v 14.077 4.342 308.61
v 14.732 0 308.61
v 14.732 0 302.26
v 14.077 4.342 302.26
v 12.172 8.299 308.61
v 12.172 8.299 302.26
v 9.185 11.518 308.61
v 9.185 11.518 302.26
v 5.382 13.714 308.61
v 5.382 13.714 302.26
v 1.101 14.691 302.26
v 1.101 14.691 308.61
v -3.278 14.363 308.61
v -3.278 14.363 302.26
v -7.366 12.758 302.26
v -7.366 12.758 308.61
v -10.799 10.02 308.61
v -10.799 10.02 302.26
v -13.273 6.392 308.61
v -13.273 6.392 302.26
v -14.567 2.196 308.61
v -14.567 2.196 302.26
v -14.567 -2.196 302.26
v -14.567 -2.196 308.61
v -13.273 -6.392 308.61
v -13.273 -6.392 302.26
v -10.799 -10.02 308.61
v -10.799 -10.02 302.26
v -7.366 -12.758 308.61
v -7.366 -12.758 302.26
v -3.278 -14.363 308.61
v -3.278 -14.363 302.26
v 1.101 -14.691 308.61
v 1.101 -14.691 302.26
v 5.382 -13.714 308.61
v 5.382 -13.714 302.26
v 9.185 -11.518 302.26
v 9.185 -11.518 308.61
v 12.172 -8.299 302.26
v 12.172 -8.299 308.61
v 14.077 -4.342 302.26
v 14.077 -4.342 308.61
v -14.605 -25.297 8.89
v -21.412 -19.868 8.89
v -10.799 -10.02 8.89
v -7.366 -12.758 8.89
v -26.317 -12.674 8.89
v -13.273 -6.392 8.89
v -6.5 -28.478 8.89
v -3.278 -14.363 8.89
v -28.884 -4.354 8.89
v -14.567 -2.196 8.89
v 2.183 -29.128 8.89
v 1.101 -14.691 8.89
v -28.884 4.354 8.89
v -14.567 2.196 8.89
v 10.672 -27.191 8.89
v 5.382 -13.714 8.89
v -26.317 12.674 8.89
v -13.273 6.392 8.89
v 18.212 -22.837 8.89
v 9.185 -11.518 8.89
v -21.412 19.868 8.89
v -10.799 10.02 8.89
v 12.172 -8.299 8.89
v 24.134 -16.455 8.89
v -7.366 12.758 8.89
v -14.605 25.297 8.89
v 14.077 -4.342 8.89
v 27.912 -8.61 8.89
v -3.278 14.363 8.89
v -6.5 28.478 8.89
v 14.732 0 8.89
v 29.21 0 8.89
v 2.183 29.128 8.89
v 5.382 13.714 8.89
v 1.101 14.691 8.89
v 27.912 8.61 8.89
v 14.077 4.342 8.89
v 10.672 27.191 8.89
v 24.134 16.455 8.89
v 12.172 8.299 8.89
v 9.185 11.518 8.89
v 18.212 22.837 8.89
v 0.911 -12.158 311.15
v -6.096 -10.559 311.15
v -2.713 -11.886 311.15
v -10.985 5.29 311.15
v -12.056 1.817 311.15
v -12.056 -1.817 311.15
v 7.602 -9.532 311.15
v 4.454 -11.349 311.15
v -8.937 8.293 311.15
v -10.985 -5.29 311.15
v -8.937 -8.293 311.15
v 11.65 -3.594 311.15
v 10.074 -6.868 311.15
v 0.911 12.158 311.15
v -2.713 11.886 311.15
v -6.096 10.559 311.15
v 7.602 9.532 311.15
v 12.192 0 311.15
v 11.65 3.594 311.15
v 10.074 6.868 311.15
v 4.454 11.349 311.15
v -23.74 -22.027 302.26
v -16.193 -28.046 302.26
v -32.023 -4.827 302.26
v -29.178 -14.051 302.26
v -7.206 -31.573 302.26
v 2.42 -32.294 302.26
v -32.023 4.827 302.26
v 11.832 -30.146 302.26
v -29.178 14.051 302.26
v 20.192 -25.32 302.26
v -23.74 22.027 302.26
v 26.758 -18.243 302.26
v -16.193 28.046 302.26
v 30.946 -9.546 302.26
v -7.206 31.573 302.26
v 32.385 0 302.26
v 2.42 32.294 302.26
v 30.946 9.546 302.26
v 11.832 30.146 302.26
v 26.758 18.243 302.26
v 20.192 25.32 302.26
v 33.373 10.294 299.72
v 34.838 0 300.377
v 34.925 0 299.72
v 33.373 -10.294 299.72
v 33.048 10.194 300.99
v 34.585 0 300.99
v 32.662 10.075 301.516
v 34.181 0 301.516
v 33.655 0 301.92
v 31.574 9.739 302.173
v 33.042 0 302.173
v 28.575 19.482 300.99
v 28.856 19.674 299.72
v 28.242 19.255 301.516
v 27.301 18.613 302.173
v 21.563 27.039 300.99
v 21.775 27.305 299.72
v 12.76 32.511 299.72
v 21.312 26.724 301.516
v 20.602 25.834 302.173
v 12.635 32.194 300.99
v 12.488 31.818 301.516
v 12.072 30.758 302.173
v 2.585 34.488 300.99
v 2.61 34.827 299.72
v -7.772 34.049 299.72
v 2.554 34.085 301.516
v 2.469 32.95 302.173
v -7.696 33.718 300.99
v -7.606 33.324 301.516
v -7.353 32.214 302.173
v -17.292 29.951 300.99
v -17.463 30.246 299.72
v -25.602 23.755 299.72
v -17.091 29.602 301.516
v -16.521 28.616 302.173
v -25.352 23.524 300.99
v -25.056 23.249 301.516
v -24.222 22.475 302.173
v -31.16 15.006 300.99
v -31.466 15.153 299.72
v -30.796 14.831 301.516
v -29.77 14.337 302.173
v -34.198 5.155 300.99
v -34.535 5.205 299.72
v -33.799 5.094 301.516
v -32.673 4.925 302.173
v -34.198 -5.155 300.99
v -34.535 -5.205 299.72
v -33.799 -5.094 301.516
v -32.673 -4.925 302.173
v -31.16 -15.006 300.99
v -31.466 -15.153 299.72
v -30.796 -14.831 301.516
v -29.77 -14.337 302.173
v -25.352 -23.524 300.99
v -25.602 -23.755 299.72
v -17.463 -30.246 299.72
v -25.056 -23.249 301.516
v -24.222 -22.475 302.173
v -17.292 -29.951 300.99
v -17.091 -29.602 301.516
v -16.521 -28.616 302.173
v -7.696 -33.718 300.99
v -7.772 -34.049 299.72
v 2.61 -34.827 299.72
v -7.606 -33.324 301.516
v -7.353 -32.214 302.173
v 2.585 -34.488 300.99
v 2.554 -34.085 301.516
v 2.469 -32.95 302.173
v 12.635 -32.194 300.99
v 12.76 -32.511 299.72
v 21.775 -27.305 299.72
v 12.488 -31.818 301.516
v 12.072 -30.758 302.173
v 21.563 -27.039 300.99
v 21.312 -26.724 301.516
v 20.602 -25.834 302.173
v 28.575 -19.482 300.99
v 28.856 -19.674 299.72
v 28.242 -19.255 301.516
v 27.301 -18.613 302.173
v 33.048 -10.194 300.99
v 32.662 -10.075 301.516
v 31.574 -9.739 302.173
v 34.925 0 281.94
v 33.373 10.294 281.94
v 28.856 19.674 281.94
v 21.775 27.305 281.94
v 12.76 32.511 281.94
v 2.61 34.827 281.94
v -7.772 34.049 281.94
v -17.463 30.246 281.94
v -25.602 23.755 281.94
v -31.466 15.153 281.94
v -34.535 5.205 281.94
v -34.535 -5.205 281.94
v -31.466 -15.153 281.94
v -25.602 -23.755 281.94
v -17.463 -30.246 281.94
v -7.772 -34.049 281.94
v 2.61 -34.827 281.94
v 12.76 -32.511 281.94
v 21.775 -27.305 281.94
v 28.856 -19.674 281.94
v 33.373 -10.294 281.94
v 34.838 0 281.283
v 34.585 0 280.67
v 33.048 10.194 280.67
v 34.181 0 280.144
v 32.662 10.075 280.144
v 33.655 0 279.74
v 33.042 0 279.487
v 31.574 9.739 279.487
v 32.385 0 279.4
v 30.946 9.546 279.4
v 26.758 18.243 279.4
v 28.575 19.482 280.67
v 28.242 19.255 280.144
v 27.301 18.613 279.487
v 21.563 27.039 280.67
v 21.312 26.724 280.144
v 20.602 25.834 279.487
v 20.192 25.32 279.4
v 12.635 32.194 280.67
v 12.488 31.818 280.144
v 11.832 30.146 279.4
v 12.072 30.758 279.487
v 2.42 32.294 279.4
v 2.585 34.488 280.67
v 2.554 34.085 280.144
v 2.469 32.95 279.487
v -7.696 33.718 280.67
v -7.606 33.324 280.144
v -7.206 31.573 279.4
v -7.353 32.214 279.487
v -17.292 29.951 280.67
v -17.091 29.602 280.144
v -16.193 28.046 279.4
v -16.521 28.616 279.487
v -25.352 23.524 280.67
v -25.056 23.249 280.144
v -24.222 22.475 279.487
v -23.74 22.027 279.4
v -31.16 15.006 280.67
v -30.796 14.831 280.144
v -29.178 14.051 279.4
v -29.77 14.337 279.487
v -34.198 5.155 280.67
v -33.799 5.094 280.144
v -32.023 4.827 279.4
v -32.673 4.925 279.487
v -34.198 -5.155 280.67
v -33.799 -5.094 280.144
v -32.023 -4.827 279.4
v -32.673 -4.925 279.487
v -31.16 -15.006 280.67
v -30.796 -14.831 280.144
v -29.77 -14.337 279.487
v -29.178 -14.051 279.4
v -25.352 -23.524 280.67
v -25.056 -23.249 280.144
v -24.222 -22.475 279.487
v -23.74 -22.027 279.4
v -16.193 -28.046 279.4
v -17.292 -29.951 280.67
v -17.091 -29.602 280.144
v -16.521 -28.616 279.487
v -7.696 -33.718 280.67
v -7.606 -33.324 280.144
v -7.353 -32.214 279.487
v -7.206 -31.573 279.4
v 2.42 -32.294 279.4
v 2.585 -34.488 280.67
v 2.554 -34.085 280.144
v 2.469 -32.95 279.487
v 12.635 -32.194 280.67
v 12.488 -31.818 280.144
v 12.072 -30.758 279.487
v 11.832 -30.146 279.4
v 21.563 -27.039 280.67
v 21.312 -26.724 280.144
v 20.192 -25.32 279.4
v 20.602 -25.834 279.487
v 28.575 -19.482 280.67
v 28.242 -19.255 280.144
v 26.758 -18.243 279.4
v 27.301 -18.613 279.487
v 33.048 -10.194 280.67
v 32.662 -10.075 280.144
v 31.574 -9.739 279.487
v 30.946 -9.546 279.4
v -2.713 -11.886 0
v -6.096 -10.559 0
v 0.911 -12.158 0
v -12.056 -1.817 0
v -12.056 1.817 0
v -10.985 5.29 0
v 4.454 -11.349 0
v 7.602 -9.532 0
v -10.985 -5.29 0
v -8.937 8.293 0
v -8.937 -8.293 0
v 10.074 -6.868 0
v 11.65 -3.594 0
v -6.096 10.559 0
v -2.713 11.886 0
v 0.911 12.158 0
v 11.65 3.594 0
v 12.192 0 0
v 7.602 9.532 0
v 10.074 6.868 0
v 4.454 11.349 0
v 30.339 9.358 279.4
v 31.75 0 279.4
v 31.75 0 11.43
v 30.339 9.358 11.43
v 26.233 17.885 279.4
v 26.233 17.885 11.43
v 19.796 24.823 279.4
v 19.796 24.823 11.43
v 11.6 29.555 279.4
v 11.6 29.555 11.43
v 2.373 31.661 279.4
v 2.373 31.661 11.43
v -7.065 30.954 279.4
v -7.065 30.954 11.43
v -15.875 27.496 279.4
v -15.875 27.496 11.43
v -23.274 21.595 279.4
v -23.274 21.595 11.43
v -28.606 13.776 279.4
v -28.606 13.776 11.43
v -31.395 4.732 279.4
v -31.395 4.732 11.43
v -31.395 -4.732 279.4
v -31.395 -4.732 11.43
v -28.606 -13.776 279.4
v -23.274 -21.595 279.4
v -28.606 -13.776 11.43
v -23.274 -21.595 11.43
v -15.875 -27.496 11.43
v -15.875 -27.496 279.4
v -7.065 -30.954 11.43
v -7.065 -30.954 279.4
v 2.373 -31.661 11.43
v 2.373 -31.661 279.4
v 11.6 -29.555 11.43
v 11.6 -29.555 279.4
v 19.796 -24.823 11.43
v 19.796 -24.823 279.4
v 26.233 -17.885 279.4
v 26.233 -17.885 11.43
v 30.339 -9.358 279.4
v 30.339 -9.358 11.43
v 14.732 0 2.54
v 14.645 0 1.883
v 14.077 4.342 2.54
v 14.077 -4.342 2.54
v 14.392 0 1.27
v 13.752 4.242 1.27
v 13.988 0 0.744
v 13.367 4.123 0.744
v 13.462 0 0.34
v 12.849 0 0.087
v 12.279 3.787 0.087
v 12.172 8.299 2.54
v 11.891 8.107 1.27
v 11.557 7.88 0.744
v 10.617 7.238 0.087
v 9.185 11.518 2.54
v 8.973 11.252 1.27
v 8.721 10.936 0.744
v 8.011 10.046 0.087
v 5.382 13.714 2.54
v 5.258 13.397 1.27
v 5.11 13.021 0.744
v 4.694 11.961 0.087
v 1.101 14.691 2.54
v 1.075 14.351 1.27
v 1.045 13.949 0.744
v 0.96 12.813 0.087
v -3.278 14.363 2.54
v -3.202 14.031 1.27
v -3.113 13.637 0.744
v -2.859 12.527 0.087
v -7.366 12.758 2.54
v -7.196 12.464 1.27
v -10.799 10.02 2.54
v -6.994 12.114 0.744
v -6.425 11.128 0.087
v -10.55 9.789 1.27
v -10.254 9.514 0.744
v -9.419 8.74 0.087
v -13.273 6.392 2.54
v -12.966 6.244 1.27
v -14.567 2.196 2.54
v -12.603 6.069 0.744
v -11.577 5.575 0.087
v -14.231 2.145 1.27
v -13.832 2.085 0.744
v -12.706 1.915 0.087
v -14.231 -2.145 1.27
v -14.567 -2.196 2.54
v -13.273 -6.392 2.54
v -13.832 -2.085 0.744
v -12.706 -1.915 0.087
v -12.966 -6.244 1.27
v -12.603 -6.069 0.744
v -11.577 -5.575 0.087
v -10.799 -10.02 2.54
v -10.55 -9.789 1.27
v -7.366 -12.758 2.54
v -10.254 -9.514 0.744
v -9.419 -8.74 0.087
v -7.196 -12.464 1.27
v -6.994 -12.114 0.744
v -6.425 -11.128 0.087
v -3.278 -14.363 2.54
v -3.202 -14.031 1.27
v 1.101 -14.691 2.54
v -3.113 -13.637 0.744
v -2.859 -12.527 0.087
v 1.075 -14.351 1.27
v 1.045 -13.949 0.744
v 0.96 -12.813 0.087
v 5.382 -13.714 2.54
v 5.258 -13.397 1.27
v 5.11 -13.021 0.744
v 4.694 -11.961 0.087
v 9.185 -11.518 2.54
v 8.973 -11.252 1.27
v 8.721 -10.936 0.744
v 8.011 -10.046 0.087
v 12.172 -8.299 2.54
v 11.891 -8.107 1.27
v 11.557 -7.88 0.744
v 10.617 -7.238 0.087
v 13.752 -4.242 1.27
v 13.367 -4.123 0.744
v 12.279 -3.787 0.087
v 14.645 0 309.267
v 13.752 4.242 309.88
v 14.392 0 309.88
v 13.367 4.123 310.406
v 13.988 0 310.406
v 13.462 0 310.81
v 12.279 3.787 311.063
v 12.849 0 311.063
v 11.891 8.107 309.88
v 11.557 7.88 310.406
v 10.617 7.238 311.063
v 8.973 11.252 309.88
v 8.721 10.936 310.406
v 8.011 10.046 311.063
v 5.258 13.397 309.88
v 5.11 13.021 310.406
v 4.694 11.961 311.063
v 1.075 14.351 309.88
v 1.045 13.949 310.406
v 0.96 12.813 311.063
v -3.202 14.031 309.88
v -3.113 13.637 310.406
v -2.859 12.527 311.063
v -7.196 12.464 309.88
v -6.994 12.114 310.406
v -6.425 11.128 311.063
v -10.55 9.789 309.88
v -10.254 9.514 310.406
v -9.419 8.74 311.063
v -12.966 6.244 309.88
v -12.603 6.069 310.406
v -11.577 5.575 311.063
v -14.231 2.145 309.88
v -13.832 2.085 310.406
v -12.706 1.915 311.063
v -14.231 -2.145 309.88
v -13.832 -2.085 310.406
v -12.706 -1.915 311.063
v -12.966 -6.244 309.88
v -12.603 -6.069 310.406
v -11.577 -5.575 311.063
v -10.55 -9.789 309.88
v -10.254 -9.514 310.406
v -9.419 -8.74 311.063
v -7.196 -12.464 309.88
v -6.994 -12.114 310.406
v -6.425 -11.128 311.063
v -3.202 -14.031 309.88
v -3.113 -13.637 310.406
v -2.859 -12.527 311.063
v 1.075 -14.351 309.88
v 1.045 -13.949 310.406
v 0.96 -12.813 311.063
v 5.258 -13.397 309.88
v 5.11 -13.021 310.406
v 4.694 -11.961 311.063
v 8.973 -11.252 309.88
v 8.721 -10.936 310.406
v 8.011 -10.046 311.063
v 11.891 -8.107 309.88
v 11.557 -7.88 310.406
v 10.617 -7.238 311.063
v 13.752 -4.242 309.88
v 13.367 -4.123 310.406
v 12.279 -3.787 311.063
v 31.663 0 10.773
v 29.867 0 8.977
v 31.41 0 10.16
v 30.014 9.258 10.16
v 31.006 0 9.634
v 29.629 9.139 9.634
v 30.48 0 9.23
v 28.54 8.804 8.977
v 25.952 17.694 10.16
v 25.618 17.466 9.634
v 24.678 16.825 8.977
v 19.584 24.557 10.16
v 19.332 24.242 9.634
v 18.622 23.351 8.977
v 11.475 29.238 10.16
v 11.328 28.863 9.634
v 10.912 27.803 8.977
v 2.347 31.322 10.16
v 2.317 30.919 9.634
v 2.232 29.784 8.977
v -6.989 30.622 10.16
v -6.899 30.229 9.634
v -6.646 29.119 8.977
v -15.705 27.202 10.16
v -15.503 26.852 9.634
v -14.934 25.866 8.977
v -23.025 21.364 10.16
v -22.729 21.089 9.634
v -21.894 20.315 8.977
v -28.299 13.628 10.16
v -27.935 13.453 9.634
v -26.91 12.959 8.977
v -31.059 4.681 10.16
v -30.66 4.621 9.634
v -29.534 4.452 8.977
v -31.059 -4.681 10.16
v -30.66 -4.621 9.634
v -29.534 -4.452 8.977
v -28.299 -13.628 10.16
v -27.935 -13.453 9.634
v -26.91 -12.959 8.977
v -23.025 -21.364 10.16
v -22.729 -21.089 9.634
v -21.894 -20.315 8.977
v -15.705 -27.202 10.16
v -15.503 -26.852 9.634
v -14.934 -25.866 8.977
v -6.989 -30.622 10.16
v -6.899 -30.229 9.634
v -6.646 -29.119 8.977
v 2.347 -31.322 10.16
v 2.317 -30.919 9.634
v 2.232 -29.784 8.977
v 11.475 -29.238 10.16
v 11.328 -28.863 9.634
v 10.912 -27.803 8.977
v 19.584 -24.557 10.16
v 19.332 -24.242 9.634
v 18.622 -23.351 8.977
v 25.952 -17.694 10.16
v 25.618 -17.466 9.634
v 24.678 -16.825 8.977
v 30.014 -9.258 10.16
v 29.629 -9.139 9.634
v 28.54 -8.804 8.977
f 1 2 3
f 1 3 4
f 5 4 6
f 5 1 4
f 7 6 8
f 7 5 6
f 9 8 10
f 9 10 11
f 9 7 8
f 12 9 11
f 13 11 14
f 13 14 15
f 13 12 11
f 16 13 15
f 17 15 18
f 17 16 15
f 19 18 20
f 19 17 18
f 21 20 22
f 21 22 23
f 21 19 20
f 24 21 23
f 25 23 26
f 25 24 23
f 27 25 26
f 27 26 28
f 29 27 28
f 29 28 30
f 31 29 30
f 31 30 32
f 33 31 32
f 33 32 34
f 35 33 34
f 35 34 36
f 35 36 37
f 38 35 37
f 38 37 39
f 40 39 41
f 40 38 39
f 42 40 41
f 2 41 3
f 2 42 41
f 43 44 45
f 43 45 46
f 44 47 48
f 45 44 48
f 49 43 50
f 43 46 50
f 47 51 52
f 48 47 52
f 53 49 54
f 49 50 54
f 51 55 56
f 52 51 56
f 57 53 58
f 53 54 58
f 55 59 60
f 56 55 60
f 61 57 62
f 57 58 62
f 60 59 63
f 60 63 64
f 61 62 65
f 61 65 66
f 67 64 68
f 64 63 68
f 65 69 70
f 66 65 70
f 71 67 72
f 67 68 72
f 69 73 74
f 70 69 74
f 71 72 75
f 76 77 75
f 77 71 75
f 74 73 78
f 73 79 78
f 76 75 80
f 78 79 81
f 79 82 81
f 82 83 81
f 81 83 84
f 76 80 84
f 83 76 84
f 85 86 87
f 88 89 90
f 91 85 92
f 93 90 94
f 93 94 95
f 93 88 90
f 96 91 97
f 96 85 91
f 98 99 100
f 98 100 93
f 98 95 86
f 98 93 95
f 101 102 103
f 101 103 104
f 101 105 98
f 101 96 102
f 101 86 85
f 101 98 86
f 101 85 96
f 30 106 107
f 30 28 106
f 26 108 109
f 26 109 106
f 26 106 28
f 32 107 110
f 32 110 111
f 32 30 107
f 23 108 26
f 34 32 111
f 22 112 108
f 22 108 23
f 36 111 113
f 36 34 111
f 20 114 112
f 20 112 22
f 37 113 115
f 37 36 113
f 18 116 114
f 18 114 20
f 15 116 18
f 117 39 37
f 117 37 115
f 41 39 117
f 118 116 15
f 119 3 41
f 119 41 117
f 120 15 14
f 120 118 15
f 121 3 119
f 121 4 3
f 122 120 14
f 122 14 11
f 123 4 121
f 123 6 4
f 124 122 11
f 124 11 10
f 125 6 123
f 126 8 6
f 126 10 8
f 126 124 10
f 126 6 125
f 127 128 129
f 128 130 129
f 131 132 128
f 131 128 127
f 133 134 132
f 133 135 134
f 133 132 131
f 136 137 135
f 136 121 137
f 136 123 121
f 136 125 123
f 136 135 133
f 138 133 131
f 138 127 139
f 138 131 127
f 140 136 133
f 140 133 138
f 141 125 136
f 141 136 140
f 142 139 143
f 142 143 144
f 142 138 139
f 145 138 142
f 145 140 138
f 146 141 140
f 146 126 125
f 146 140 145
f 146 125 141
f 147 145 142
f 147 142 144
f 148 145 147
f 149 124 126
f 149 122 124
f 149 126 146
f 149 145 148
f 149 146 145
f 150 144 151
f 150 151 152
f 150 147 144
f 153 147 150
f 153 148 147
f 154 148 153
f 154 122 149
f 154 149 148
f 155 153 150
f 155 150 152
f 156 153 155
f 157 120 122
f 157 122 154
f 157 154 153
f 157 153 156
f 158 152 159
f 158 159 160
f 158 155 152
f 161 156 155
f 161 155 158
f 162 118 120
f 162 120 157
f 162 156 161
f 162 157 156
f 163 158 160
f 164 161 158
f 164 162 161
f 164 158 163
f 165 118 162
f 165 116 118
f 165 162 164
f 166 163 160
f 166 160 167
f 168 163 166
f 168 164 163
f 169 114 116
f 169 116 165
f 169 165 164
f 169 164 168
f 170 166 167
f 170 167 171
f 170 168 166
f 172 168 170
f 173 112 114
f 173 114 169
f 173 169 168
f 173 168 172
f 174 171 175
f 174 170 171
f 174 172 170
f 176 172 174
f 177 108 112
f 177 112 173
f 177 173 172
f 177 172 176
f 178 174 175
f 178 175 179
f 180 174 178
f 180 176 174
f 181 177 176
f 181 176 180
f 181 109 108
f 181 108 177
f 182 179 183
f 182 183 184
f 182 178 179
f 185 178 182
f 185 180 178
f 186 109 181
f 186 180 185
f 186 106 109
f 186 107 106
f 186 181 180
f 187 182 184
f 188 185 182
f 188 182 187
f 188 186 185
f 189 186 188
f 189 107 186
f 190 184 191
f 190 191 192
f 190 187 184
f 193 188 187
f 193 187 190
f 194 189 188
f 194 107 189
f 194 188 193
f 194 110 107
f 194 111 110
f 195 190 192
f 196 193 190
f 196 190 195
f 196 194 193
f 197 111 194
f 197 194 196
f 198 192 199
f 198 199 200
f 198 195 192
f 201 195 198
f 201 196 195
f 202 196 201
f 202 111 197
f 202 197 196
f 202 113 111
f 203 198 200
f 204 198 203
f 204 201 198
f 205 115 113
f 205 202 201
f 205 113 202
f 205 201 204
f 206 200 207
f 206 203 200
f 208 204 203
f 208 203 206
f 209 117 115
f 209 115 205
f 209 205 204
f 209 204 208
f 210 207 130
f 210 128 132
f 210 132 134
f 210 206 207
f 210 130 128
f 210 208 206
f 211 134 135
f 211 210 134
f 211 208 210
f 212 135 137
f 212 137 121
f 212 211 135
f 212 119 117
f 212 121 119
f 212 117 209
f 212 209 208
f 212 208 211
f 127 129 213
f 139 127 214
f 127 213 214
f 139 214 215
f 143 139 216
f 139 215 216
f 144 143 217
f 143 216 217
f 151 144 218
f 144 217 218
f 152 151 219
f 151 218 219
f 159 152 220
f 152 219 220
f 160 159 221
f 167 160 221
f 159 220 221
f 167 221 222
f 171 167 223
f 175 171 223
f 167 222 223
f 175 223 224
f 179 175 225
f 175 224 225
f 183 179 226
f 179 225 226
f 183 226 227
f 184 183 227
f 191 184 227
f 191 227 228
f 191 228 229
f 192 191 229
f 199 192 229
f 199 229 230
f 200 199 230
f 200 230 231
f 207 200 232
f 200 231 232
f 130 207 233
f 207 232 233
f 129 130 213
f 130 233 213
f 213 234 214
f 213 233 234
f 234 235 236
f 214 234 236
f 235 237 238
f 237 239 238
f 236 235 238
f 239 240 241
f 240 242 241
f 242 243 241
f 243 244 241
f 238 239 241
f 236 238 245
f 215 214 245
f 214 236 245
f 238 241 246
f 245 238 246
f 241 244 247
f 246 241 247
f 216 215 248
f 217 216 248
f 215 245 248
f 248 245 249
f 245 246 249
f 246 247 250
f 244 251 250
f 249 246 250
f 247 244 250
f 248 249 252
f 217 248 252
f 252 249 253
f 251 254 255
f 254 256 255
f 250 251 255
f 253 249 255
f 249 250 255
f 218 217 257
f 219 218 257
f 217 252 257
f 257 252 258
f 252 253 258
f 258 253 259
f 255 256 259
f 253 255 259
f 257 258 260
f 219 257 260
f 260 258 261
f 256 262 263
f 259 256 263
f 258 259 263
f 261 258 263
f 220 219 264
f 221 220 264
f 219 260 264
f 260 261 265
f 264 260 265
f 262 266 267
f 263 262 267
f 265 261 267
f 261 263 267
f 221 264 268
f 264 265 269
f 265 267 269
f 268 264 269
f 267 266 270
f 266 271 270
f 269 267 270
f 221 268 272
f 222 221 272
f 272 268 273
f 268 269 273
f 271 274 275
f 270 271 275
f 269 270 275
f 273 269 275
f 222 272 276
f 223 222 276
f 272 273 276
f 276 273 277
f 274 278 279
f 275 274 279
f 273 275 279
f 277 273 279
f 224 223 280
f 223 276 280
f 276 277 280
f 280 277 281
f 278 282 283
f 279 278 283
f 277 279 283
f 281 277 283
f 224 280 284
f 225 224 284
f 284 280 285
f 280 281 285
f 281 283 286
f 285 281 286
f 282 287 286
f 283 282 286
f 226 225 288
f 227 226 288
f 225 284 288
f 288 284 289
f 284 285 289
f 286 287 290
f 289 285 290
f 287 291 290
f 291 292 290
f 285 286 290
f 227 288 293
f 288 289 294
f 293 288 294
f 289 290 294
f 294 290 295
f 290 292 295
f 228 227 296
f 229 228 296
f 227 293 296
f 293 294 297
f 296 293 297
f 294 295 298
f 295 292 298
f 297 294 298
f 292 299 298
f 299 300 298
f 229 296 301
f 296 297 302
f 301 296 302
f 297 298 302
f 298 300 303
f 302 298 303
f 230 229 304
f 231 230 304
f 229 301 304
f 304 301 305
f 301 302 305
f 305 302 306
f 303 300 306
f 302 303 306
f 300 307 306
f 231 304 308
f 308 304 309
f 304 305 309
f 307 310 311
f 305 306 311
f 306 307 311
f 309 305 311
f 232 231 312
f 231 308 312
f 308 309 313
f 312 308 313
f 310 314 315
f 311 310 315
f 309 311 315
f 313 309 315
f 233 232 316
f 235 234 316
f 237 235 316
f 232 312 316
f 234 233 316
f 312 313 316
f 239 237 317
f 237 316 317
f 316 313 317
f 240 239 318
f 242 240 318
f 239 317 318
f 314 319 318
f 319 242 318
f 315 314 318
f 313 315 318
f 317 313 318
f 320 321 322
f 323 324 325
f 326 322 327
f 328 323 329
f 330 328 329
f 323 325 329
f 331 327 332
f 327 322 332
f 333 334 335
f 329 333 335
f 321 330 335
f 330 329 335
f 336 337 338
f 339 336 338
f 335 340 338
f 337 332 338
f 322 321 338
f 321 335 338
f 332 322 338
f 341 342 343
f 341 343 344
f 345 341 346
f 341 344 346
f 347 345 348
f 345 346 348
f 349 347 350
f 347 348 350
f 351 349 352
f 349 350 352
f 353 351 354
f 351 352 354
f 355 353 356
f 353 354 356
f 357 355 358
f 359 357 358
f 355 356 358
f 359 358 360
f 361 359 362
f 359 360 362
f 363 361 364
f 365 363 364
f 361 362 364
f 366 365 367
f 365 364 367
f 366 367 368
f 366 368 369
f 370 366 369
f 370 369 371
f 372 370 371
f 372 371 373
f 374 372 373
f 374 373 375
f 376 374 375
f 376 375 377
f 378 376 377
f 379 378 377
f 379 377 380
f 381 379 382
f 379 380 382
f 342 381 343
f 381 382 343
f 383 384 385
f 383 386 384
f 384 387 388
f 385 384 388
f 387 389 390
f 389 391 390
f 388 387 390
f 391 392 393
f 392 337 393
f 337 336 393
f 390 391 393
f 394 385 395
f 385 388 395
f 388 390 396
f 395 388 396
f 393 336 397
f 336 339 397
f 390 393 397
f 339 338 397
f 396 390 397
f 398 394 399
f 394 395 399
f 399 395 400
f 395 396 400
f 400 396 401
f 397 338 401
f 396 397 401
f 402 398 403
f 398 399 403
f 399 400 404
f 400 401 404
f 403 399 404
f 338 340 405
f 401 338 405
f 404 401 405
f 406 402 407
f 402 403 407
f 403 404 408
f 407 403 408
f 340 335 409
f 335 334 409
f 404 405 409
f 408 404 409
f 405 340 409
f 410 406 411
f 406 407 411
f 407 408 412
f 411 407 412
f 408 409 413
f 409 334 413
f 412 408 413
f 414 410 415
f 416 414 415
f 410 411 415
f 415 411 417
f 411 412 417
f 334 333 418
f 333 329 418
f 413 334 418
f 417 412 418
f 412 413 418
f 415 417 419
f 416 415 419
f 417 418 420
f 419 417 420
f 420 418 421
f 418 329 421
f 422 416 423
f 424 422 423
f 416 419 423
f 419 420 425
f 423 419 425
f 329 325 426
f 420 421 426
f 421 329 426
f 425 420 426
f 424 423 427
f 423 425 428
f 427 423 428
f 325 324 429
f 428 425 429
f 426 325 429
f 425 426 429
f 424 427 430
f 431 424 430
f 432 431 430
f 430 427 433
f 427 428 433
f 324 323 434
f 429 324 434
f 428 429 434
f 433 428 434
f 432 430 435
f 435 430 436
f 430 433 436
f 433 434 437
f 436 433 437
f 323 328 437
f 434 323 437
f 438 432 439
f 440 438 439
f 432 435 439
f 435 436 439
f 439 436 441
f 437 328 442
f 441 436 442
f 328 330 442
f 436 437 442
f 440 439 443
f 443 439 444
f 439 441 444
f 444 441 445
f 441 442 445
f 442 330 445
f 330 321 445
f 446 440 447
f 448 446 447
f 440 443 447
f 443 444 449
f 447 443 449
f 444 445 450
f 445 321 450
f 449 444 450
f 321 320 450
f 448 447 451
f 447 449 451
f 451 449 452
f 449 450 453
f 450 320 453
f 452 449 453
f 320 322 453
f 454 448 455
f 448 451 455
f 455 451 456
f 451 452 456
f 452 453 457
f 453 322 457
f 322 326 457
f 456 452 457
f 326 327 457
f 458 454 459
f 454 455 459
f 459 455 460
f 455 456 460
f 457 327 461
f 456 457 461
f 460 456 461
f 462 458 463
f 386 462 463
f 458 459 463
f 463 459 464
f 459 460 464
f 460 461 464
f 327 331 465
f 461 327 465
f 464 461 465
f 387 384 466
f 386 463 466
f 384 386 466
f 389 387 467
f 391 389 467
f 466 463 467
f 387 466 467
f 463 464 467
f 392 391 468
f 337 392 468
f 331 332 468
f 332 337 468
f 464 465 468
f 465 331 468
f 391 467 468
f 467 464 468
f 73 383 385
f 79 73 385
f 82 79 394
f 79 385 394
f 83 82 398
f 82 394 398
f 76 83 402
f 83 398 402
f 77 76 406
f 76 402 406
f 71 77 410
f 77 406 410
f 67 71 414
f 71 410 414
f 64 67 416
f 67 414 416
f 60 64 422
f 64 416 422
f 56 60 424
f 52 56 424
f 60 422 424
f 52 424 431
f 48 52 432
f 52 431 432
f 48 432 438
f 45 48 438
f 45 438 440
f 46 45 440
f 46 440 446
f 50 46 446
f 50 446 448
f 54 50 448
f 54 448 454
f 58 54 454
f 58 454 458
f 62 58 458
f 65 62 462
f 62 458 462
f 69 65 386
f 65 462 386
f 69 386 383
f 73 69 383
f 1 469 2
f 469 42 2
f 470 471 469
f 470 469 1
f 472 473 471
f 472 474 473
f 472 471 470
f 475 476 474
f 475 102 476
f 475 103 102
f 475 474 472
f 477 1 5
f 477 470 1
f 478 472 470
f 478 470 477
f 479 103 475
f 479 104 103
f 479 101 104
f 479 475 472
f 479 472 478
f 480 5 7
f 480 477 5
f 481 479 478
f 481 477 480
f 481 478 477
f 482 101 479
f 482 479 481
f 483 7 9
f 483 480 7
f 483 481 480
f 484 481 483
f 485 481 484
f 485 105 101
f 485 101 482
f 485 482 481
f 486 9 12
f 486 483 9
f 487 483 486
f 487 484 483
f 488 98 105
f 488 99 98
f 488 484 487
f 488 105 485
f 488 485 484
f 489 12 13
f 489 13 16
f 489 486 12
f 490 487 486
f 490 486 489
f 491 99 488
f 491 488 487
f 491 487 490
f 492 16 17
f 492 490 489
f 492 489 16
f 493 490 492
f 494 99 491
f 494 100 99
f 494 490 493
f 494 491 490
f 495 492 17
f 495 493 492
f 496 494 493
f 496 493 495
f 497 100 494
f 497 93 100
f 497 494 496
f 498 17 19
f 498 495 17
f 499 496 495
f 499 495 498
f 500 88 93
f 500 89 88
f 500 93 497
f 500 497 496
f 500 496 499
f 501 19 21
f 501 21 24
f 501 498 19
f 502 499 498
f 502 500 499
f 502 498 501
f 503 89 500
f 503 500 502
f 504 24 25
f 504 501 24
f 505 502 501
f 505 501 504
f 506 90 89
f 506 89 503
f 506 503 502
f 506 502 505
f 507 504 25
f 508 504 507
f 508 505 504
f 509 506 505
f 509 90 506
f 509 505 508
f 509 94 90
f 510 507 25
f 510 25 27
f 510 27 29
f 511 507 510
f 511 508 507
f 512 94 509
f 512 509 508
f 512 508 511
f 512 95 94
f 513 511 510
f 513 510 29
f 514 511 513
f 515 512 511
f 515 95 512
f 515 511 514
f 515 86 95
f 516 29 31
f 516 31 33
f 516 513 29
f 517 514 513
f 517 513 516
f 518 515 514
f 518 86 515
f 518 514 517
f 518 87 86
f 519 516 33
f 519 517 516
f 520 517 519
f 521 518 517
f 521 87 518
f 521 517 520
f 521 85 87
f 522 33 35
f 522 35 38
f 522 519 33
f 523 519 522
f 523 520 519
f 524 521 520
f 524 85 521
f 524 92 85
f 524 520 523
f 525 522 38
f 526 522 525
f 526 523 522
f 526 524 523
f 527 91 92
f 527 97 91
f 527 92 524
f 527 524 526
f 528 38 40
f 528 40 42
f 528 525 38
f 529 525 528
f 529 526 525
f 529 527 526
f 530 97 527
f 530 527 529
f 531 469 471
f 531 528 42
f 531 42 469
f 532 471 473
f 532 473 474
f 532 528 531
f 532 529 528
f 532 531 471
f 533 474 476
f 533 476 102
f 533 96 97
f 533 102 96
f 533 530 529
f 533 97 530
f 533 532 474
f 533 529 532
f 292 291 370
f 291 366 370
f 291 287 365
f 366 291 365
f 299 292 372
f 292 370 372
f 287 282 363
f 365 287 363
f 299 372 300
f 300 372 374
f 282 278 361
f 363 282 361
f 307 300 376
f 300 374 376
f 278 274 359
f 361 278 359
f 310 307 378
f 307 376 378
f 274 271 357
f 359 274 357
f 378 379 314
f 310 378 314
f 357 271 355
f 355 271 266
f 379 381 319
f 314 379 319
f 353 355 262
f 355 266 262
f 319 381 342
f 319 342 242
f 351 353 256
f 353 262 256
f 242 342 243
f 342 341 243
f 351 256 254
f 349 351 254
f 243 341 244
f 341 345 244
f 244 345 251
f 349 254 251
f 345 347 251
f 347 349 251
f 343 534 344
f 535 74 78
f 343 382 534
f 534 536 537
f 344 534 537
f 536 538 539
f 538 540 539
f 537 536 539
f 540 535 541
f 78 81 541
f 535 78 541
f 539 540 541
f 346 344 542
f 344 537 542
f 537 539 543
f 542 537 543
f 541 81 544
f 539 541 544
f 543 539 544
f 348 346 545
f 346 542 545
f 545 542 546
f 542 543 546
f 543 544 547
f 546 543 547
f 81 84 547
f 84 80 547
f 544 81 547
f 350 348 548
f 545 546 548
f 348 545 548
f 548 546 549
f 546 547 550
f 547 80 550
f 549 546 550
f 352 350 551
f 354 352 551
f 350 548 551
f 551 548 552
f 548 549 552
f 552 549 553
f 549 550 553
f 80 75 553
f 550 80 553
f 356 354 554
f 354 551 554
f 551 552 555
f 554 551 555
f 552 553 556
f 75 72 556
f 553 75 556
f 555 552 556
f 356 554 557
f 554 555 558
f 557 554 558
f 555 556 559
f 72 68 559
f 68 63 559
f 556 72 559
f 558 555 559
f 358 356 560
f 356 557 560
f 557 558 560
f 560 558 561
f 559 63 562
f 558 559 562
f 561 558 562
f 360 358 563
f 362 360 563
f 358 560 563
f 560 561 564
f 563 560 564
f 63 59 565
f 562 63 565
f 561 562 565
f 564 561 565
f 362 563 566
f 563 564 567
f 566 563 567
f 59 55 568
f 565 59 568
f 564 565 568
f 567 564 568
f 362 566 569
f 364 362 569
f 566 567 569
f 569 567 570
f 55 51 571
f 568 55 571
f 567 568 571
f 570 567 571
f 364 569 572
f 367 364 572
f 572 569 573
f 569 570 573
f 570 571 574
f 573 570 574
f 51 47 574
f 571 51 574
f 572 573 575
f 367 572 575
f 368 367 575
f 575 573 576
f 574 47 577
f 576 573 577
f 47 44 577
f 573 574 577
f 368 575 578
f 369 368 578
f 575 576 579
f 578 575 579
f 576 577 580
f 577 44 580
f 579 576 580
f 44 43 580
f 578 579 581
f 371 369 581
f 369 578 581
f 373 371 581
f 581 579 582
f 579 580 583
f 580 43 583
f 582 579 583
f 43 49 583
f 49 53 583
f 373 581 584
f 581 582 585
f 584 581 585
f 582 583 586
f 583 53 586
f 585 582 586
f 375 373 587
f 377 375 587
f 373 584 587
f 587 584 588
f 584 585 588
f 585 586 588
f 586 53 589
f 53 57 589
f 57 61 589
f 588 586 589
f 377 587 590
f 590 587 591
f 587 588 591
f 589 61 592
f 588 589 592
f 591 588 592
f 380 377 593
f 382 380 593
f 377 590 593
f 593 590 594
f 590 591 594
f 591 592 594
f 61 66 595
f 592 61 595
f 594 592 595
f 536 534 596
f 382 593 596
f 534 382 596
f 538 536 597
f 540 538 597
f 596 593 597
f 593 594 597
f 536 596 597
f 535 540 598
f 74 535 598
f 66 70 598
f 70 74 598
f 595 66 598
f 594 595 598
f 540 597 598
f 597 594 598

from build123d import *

# Parameters (mm, degrees)
SKETCH1_R           = 14.732
BOSS_EXTRUDE1_DEPTH = 8.89
SKETCH2_R           = 31.75
BOSS_EXTRUDE2_DEPTH = 270.51
SKETCH3_R           = 34.925
BOSS_EXTRUDE3_DEPTH = 22.86
FILLET1_R           = 2.54


with BuildPart() as part:
    # Sketch1 → Boss-Extrude1 (new body)
    with BuildSketch(Plane.XY):
        Circle(SKETCH1_R)
    boss_extrude1 = extrude(amount=BOSS_EXTRUDE1_DEPTH)

    # Sketch2 → Boss-Extrude2 (add)
    with BuildSketch(Plane.XY.offset(8.89)):
        Circle(SKETCH2_R)
    extrude(amount=BOSS_EXTRUDE2_DEPTH)

    # Sketch3 → Boss-Extrude3 (add)
    with BuildSketch(Plane.XY.offset(279.4)):
        Circle(SKETCH3_R)
    extrude(amount=BOSS_EXTRUDE3_DEPTH)

    # Mirror1: Boss-Extrude1 across plane
    add(boss_extrude1.mirror(Plane(origin=(0, 0, 155.575), x_dir=(1, 0, 0), z_dir=(0, 0, -1))))

    # Fillet1
    fillet1_edges = [part.edges().sort_by_distance(p)[0] for p in [
        (-14.732, 0, 311.15),
        (-14.732, 0, 0),
        (-31.75, 0, 8.89),
        (-34.925, 0, 279.4),
        (-34.925, 0, 302.26),
    ]]
    fillet(fillet1_edges, radius=FILLET1_R)


solid = part.part
